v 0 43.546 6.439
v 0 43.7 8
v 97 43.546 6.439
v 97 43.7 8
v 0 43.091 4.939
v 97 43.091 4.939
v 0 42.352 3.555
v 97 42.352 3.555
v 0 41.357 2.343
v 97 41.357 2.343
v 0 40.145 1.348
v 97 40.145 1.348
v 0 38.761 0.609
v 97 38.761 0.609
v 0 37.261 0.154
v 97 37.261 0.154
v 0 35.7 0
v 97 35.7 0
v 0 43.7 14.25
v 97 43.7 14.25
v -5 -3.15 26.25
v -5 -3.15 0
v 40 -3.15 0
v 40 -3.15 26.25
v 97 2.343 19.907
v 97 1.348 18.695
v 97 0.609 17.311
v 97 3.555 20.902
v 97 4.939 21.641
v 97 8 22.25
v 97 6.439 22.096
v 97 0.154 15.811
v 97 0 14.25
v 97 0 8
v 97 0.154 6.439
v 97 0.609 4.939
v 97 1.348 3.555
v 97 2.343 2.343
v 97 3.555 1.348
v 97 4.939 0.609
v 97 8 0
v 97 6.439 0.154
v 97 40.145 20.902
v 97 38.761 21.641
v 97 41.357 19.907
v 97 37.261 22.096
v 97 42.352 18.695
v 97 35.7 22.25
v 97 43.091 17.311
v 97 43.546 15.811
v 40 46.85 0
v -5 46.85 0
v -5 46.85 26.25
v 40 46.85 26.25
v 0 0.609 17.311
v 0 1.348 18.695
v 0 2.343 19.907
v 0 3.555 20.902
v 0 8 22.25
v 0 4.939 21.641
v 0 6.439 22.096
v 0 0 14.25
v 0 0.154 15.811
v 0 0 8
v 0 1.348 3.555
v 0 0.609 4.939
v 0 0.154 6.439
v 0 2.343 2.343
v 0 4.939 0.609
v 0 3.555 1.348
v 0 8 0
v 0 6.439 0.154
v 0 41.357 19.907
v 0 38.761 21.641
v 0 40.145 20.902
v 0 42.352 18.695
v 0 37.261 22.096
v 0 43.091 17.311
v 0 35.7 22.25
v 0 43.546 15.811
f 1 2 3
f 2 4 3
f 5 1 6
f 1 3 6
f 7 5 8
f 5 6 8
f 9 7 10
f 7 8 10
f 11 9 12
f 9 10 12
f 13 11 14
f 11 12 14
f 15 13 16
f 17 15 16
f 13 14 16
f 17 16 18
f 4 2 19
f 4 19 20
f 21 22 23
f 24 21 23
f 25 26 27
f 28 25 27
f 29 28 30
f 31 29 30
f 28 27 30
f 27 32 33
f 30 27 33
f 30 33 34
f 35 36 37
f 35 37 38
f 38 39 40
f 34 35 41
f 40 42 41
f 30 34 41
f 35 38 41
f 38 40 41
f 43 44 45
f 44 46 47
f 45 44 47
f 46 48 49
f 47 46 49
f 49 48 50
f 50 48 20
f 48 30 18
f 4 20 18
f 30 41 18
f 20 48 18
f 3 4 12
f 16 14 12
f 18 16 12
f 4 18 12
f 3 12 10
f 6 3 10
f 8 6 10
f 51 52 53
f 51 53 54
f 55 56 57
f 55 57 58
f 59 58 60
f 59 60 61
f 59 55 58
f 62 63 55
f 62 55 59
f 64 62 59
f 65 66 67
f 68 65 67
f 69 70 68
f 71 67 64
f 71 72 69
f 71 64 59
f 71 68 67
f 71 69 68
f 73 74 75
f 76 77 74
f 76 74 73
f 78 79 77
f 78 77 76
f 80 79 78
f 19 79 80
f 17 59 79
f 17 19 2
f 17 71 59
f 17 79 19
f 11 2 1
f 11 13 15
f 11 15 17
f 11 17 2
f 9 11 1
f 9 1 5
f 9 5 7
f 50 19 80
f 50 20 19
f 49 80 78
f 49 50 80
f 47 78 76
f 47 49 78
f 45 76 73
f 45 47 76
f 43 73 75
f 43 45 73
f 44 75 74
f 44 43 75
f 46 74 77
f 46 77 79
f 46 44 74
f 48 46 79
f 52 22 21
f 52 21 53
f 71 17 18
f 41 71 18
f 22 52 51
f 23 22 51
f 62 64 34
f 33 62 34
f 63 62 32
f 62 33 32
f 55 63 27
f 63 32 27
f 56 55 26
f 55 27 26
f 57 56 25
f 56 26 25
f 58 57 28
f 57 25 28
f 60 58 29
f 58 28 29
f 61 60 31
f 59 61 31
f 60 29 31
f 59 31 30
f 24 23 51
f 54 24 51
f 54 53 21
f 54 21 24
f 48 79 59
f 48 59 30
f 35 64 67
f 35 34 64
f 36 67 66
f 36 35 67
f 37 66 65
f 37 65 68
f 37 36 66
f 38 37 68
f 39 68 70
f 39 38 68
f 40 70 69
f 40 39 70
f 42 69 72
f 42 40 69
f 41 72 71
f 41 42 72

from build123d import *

# Parameters (mm, degrees)
BOX_W        = 97
BOX_H        = 43.7
BOX_DEPTH    = 22.25
FILLET_R     = 8
BOX001_W     = 45
BOX001_H     = 50
BOX001_DEPTH = 26.25


with BuildPart() as fillet_body:
    # Box → Box (new body)
    with BuildSketch(Plane.XY):
        with Locations((48.5, 21.85)):
            Rectangle(BOX_W, BOX_H)
    extrude(amount=BOX_DEPTH)

    # Fillet
    fillet_edges = [fillet_body.edges().sort_by_distance(p)[0] for p in [
        (48.5, 0, 0),
        (48.5, 0, 22.25),
        (48.5, 43.7, 0),
        (48.5, 43.7, 22.25),
    ]]
    fillet(fillet_edges, radius=FILLET_R)


with BuildPart() as cube001:
    # Box001 → Box001 (new body)
    with BuildSketch(Plane(origin=(-5, -3.15, 0), x_dir=(1, 0, 0), z_dir=(0, 0, 1))):
        with Locations((22.5, 25)):
            Rectangle(BOX001_W, BOX001_H)
    extrude(amount=BOX001_DEPTH)


solid = Compound([fillet_body.part, cube001.part])
